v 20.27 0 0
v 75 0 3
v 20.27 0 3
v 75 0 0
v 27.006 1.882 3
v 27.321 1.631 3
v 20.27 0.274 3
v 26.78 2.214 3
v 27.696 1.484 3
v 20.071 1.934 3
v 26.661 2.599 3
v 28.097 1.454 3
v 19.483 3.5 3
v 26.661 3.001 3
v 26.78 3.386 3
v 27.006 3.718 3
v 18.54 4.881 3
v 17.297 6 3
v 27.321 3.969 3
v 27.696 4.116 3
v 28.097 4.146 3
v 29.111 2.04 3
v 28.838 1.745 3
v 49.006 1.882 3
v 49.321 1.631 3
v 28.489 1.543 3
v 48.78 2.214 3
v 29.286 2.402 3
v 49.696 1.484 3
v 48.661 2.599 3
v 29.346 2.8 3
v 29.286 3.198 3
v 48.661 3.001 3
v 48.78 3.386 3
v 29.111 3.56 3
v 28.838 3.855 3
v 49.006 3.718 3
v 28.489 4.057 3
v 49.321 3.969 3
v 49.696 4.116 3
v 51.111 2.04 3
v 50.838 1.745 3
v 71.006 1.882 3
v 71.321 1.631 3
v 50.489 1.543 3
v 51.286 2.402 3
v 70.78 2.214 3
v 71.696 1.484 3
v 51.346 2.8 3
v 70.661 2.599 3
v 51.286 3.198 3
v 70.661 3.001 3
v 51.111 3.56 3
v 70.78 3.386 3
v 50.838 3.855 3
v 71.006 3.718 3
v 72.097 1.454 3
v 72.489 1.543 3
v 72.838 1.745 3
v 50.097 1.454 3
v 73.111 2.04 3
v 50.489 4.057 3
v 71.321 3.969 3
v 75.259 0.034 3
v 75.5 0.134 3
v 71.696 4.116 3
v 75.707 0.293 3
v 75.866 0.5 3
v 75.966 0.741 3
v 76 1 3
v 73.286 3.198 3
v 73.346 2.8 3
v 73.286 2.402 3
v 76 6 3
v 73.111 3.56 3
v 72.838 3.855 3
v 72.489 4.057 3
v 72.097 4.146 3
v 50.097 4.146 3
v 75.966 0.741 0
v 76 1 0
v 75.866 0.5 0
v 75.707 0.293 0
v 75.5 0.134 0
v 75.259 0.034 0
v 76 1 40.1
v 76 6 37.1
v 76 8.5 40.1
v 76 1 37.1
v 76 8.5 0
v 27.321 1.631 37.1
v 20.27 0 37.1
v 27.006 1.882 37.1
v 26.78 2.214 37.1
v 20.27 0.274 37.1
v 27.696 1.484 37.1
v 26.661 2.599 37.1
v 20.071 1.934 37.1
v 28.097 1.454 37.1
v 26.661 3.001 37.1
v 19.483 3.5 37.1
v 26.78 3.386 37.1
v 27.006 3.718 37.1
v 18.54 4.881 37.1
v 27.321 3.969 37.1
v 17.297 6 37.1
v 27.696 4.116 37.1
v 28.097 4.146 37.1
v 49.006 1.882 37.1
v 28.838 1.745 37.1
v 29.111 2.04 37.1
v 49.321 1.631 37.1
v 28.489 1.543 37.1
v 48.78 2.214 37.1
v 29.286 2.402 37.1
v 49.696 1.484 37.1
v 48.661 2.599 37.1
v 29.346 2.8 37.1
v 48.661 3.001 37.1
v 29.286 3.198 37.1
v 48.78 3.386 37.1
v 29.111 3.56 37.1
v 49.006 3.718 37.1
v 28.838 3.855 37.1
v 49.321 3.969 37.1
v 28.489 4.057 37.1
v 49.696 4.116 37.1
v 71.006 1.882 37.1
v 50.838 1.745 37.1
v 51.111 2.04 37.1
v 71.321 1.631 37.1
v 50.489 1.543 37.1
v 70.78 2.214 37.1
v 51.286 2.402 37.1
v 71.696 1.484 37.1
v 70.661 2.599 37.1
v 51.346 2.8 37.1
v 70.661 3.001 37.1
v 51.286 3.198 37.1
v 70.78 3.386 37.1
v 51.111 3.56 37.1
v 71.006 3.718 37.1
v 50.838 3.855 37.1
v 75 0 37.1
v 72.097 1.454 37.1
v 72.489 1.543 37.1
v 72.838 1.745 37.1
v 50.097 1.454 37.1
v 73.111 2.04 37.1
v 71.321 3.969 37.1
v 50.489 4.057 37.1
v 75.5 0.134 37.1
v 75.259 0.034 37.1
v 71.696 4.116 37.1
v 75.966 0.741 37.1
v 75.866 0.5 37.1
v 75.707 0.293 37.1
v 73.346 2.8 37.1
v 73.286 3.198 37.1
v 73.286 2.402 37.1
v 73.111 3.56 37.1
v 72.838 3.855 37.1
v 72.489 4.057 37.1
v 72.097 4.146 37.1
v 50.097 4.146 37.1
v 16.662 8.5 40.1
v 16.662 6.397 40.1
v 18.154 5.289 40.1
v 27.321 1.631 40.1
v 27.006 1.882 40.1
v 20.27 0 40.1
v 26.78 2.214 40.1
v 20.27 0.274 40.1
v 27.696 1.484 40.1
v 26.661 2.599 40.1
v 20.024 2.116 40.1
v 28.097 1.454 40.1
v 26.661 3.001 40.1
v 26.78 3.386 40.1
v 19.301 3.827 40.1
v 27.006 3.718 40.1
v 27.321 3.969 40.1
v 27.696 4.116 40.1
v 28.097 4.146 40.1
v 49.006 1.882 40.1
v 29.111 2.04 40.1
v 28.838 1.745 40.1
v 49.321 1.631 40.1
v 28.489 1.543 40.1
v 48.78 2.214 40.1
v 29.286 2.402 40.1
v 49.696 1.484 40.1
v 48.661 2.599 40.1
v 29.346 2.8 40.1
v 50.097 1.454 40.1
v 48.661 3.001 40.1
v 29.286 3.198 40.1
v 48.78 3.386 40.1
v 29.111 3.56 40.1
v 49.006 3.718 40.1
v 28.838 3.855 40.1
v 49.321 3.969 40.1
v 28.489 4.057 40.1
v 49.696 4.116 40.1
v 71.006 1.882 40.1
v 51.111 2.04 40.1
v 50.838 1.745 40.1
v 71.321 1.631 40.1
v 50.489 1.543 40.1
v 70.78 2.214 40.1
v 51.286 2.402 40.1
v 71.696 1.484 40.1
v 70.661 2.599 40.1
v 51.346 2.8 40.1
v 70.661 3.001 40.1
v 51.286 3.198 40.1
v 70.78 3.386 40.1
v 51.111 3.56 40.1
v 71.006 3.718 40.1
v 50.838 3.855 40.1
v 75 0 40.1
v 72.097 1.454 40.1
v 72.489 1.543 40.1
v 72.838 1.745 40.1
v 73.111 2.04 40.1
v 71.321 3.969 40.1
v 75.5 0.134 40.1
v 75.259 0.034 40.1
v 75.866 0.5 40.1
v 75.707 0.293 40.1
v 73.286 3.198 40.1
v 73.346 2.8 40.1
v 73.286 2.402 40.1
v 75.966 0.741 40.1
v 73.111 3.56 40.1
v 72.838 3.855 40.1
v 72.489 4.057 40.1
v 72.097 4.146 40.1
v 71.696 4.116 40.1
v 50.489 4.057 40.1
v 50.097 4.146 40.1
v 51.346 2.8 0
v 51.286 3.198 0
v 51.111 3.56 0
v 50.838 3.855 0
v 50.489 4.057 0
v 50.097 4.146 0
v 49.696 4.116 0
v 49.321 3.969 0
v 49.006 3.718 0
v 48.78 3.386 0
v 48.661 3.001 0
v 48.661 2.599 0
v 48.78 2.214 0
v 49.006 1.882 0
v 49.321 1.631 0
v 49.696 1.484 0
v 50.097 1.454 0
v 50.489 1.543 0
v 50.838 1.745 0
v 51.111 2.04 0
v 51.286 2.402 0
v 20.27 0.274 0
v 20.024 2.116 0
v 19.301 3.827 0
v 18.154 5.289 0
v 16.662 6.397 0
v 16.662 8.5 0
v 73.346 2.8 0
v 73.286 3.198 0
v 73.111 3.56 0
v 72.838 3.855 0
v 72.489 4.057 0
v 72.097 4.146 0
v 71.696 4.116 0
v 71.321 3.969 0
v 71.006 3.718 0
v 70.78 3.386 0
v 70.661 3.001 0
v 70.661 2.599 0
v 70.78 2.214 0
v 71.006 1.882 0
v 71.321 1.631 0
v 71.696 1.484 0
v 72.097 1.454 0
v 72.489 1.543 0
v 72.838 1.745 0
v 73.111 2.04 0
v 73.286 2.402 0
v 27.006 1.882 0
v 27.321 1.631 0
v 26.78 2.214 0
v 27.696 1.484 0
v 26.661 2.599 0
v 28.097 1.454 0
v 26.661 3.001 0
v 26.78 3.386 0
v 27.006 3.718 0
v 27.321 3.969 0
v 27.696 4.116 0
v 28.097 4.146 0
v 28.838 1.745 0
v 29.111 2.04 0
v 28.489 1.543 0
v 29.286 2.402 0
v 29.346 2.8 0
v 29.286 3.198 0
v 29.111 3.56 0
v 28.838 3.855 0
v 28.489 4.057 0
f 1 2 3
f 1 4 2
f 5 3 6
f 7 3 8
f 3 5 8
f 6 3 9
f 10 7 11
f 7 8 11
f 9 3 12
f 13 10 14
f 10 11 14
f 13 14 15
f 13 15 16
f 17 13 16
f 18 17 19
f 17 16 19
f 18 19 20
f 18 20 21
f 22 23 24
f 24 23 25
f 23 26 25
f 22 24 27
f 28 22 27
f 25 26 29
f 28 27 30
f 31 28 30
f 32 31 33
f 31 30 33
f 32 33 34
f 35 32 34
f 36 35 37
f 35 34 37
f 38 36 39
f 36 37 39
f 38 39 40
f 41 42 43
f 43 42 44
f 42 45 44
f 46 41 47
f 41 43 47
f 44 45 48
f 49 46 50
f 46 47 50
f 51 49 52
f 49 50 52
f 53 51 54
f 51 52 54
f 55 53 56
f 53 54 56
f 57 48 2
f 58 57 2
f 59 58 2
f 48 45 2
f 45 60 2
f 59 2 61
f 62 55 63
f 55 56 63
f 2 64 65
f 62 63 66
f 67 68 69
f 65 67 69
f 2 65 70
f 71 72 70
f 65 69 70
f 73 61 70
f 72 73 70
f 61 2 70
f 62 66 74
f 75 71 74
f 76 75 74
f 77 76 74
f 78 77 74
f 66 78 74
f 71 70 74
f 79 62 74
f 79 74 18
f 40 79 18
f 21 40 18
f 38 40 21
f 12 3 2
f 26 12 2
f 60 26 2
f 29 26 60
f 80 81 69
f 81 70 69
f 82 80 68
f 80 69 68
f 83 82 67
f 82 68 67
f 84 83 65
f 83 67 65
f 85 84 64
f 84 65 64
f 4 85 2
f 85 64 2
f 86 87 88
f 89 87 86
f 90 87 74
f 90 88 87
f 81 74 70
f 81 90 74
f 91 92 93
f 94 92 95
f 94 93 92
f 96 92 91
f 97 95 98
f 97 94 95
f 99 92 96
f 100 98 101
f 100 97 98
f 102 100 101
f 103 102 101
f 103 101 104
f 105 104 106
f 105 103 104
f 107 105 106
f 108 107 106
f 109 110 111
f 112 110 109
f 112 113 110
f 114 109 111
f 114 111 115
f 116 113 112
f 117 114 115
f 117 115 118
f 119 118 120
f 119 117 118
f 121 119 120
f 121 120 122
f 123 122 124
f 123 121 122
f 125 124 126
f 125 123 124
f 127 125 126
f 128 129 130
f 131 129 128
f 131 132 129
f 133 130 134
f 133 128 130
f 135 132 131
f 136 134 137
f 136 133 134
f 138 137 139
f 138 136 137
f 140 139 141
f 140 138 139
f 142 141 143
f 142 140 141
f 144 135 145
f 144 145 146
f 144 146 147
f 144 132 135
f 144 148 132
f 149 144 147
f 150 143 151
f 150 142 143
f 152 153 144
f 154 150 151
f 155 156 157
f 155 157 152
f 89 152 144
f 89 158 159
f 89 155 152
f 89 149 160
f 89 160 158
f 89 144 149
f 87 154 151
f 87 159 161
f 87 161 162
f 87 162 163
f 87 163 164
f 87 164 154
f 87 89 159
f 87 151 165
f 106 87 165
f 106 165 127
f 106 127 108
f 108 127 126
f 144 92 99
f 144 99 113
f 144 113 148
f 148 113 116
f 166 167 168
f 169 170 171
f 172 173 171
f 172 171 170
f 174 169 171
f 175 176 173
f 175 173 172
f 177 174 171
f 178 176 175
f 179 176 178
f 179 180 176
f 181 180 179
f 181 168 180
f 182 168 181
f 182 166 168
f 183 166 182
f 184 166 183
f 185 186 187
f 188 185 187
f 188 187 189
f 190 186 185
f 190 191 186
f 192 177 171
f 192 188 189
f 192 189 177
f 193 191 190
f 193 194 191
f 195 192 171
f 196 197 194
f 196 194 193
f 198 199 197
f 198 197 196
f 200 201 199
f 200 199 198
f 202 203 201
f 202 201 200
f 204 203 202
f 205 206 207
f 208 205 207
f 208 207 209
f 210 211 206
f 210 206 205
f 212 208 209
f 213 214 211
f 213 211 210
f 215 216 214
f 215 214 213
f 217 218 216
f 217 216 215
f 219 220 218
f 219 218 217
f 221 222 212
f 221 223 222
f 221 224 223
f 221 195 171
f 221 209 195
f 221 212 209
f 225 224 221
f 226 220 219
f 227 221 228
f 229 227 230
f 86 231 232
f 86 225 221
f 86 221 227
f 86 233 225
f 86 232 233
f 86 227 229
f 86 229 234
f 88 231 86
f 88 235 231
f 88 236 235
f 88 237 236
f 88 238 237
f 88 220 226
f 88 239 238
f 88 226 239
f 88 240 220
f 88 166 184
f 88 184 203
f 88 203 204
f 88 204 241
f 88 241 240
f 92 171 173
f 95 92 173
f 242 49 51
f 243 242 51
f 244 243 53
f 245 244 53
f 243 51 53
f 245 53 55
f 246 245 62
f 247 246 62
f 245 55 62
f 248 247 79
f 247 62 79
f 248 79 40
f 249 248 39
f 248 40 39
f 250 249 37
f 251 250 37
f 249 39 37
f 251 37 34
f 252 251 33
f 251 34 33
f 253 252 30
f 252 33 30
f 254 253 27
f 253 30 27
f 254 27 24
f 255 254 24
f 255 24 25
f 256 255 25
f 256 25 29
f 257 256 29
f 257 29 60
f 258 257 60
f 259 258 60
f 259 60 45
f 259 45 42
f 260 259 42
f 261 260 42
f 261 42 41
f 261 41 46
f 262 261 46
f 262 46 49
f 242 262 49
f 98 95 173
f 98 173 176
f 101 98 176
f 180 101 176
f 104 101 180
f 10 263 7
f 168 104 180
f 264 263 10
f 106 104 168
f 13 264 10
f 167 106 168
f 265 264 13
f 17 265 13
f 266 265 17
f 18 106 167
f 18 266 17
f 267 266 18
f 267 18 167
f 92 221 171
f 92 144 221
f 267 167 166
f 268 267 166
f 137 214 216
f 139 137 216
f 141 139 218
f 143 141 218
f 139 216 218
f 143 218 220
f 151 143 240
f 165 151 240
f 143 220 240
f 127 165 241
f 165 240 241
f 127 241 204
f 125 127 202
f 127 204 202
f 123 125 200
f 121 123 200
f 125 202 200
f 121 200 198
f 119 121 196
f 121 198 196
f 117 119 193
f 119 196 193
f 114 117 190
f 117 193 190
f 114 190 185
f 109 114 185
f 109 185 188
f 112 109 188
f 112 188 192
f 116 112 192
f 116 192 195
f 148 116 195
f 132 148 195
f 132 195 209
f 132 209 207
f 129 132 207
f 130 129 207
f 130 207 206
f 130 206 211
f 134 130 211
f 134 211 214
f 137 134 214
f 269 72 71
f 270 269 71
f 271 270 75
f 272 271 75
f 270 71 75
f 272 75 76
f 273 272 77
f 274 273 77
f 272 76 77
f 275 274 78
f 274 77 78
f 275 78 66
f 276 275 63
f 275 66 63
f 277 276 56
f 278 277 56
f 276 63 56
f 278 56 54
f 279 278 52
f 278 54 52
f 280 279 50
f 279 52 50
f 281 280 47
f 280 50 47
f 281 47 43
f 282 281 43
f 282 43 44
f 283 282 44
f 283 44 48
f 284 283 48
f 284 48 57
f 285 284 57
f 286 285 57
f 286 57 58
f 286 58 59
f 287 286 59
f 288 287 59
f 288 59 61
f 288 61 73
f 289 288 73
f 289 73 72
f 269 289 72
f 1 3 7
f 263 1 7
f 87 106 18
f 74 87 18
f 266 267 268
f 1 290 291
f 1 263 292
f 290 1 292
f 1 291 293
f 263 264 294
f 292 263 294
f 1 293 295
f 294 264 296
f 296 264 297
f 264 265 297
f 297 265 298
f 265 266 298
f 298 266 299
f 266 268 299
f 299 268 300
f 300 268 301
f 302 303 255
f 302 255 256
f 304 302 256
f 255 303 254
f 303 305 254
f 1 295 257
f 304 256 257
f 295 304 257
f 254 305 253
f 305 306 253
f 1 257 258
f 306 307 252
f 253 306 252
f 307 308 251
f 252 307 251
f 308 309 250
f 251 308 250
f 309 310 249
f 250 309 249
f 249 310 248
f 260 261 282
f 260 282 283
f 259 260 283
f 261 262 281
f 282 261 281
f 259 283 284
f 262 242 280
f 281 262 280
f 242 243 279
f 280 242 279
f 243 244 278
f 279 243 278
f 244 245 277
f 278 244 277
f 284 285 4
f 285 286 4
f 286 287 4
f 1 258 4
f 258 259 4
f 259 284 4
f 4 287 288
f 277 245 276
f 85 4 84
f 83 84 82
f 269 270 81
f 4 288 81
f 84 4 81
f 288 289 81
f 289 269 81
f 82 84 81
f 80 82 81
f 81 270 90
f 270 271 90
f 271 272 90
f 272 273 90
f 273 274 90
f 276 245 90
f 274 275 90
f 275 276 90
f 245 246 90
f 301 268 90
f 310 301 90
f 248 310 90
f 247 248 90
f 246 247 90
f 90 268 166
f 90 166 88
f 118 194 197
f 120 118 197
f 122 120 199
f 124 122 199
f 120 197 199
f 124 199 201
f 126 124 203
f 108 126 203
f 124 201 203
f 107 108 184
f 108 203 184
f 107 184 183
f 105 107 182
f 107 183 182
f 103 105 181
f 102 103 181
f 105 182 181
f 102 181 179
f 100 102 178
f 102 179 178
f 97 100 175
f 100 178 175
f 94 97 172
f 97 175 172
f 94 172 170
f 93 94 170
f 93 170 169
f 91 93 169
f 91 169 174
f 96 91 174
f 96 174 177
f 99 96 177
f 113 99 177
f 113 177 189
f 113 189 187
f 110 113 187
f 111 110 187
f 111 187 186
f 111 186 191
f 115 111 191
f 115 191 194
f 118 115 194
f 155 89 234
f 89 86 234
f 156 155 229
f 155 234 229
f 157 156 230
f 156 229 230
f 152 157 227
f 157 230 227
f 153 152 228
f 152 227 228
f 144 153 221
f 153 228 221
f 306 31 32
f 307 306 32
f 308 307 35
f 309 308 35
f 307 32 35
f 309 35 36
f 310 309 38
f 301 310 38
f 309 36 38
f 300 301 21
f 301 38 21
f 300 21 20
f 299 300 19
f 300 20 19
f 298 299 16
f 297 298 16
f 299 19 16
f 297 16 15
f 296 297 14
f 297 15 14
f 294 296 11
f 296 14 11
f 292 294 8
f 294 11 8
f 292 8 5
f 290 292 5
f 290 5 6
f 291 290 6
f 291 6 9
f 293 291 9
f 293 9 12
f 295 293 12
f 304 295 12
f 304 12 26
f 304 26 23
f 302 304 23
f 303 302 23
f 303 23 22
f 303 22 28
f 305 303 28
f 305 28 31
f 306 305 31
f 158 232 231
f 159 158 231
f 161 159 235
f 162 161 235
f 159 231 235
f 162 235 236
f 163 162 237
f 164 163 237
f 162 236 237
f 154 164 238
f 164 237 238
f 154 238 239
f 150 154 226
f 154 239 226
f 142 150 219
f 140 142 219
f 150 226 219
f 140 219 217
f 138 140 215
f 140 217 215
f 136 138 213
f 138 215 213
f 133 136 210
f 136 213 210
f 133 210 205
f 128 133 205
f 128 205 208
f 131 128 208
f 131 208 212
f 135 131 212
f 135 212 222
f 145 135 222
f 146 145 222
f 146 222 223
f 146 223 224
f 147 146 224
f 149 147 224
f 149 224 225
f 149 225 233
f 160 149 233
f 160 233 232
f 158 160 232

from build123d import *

# Parameters (mm, degrees)
BOSS_EXTRUDE1_DEPTH = 40.1
SKETCH3_R           = 1.35
CUT_EXTRUDE2_DEPTH  = 50.8
SKETCH4_R           = 1.016
CUT_EXTRUDE3_DEPTH  = 50.8
SKETCH6_W           = 62.086073973
SKETCH6_H           = 34.1
CUT_EXTRUDE4_DEPTH  = 6
BOSS_EXTRUDE5_DEPTH = 2
FILLET1_R           = 1
SKETCH17_W          = 87.972052268
SKETCH17_H          = 62.392444702
CUT_EXTRUDE5_DEPTH  = 101.73954578
SKETCH18_W          = 11.938
SKETCH18_H          = 8.5
CUT_EXTRUDE6_DEPTH  = 87.3496381
SKETCH19_W          = 9.553882118
SKETCH19_H          = 7.100488973
BOSS_EXTRUDE6_DEPTH = 40
SKETCH20_W          = 8.332283041
SKETCH20_H          = 7.273954642
CUT_EXTRUDE8_DEPTH  = 87.3496381
FILLET2_R           = 7
SKETCH21_W          = 4.7244
SKETCH21_H          = 10
CUT_EXTRUDE9_DEPTH  = 87.3496381
SKETCH22_W          = 34.1
SKETCH22_H          = 6
CUT_EXTRUDE10_DEPTH = 69.201135731


with BuildPart() as part:
    # Sketch1 → Boss-Extrude1 (new body)
    with BuildSketch(Plane.XY):
        Polygon((0, 0), (0, 52.578), (6, 52.578), (6, 8.5), (76, 8.5), (76, 0), align=None)
    extrude(amount=BOSS_EXTRUDE1_DEPTH)

    # Sketch3 → Cut-Extrude2 (cut)
    with BuildSketch(Plane.XY.offset(40.1)):
        with Locations((27.996, 2.8)):
            Circle(SKETCH3_R)
        with Locations((49.996, 2.8)):
            Circle(SKETCH3_R)
        with Locations((71.996, 2.8)):
            Circle(SKETCH3_R)
    extrude(amount=-CUT_EXTRUDE2_DEPTH, mode=Mode.SUBTRACT)

    # Sketch4 → Cut-Extrude3 (cut)
    with BuildSketch(Plane.ZY):
        with Locations((27.88, 17.6)):
            Circle(SKETCH4_R)
        with Locations(Location((11.88, 17.6, 0), (0, 0, 270))):
            Circle(SKETCH4_R)
        with Locations((27.88, 49.6)):
            Circle(SKETCH4_R)
        with Locations(Location((11.88, 49.6, 0), (0, 0, 270))):
            Circle(SKETCH4_R)
    extrude(amount=-CUT_EXTRUDE3_DEPTH, mode=Mode.SUBTRACT)

    # Sketch6 → Cut-Extrude4 (cut)
    with BuildSketch(Plane.XZ):
        with Locations((50.043036987, 20.05)):
            Rectangle(SKETCH6_W, SKETCH6_H)
    extrude(amount=-CUT_EXTRUDE4_DEPTH, mode=Mode.SUBTRACT)

    # Sketch16 → Boss-Extrude5 (add)
    with BuildSketch(Plane.XY.offset(40.1)):
        Polygon((6, 8.5), (26, 8.5), (6, 33.5), align=None)
    boss_extrude5 = extrude(amount=-BOSS_EXTRUDE5_DEPTH)

    # Mirror2: Boss-Extrude5 across plane
    add(boss_extrude5.mirror(Plane(origin=(0, 0, 20.05), x_dir=(1, 0, 0), z_dir=(0, 0, -1))))

    # Fillet1
    fillet1_edges = [part.edges().sort_by_distance(p)[0] for p in [
        (0, 0, 20.05),
        (76, 0, 38.6),
        (3, 52.578, 40.1),
        (76, 0, 1.5),
        (3, 52.578, 0),
    ]]
    fillet(fillet1_edges, radius=FILLET1_R)

    # Sketch17 → Cut-Extrude5 (cut, through all)
    with BuildSketch(Plane.XY.offset(40.1)):
        with Locations((43.986026134, 39.696222351)):
            Rectangle(SKETCH17_W, SKETCH17_H)
    extrude(amount=-CUT_EXTRUDE5_DEPTH, mode=Mode.SUBTRACT)

    # Sketch18 → Cut-Extrude6 (cut, through all)
    with BuildSketch(Plane.XY.offset(40.1)):
        with Locations((5.969, 4.25)):
            Rectangle(SKETCH18_W, SKETCH18_H)
    extrude(amount=-CUT_EXTRUDE6_DEPTH, mode=Mode.SUBTRACT)

    # Sketch19 → Boss-Extrude6 (add)
    with BuildSketch(Plane.XY.offset(40.1)):
        with Locations((16.714941059, 3.550244487)):
            Rectangle(SKETCH19_W, SKETCH19_H)
    extrude(amount=-BOSS_EXTRUDE6_DEPTH)

    # Sketch20 → Cut-Extrude8 (cut, through all)
    with BuildSketch(Plane.XY.offset(40.1)):
        with Locations((16.104141521, 3.636977321)):
            Rectangle(SKETCH20_W, SKETCH20_H)
    extrude(amount=-CUT_EXTRUDE8_DEPTH, mode=Mode.SUBTRACT)

    # Fillet2
    fillet2_edges = [part.edges().sort_by_distance(p)[0] for p in [
        (20.270283041, 7.273954642, 20.05),
    ]]
    fillet(fillet2_edges, radius=FILLET2_R)

    # Sketch21 → Cut-Extrude9 (cut, through all)
    with BuildSketch(Plane.XY.offset(40.1)):
        with Locations((14.3002, 3.5)):
            Rectangle(SKETCH21_W, SKETCH21_H)
    extrude(amount=-CUT_EXTRUDE9_DEPTH, mode=Mode.SUBTRACT)

    # Sketch22 → Cut-Extrude10 (cut, through all)
    with BuildSketch(Plane(origin=(21.491882118, 0, 0), x_dir=(0, 0, -1), z_dir=(1, 0, 0))):
        with Locations((-20.05, 3)):
            Rectangle(SKETCH22_W, SKETCH22_H)
    extrude(amount=-CUT_EXTRUDE10_DEPTH, mode=Mode.SUBTRACT)


solid = part.part
